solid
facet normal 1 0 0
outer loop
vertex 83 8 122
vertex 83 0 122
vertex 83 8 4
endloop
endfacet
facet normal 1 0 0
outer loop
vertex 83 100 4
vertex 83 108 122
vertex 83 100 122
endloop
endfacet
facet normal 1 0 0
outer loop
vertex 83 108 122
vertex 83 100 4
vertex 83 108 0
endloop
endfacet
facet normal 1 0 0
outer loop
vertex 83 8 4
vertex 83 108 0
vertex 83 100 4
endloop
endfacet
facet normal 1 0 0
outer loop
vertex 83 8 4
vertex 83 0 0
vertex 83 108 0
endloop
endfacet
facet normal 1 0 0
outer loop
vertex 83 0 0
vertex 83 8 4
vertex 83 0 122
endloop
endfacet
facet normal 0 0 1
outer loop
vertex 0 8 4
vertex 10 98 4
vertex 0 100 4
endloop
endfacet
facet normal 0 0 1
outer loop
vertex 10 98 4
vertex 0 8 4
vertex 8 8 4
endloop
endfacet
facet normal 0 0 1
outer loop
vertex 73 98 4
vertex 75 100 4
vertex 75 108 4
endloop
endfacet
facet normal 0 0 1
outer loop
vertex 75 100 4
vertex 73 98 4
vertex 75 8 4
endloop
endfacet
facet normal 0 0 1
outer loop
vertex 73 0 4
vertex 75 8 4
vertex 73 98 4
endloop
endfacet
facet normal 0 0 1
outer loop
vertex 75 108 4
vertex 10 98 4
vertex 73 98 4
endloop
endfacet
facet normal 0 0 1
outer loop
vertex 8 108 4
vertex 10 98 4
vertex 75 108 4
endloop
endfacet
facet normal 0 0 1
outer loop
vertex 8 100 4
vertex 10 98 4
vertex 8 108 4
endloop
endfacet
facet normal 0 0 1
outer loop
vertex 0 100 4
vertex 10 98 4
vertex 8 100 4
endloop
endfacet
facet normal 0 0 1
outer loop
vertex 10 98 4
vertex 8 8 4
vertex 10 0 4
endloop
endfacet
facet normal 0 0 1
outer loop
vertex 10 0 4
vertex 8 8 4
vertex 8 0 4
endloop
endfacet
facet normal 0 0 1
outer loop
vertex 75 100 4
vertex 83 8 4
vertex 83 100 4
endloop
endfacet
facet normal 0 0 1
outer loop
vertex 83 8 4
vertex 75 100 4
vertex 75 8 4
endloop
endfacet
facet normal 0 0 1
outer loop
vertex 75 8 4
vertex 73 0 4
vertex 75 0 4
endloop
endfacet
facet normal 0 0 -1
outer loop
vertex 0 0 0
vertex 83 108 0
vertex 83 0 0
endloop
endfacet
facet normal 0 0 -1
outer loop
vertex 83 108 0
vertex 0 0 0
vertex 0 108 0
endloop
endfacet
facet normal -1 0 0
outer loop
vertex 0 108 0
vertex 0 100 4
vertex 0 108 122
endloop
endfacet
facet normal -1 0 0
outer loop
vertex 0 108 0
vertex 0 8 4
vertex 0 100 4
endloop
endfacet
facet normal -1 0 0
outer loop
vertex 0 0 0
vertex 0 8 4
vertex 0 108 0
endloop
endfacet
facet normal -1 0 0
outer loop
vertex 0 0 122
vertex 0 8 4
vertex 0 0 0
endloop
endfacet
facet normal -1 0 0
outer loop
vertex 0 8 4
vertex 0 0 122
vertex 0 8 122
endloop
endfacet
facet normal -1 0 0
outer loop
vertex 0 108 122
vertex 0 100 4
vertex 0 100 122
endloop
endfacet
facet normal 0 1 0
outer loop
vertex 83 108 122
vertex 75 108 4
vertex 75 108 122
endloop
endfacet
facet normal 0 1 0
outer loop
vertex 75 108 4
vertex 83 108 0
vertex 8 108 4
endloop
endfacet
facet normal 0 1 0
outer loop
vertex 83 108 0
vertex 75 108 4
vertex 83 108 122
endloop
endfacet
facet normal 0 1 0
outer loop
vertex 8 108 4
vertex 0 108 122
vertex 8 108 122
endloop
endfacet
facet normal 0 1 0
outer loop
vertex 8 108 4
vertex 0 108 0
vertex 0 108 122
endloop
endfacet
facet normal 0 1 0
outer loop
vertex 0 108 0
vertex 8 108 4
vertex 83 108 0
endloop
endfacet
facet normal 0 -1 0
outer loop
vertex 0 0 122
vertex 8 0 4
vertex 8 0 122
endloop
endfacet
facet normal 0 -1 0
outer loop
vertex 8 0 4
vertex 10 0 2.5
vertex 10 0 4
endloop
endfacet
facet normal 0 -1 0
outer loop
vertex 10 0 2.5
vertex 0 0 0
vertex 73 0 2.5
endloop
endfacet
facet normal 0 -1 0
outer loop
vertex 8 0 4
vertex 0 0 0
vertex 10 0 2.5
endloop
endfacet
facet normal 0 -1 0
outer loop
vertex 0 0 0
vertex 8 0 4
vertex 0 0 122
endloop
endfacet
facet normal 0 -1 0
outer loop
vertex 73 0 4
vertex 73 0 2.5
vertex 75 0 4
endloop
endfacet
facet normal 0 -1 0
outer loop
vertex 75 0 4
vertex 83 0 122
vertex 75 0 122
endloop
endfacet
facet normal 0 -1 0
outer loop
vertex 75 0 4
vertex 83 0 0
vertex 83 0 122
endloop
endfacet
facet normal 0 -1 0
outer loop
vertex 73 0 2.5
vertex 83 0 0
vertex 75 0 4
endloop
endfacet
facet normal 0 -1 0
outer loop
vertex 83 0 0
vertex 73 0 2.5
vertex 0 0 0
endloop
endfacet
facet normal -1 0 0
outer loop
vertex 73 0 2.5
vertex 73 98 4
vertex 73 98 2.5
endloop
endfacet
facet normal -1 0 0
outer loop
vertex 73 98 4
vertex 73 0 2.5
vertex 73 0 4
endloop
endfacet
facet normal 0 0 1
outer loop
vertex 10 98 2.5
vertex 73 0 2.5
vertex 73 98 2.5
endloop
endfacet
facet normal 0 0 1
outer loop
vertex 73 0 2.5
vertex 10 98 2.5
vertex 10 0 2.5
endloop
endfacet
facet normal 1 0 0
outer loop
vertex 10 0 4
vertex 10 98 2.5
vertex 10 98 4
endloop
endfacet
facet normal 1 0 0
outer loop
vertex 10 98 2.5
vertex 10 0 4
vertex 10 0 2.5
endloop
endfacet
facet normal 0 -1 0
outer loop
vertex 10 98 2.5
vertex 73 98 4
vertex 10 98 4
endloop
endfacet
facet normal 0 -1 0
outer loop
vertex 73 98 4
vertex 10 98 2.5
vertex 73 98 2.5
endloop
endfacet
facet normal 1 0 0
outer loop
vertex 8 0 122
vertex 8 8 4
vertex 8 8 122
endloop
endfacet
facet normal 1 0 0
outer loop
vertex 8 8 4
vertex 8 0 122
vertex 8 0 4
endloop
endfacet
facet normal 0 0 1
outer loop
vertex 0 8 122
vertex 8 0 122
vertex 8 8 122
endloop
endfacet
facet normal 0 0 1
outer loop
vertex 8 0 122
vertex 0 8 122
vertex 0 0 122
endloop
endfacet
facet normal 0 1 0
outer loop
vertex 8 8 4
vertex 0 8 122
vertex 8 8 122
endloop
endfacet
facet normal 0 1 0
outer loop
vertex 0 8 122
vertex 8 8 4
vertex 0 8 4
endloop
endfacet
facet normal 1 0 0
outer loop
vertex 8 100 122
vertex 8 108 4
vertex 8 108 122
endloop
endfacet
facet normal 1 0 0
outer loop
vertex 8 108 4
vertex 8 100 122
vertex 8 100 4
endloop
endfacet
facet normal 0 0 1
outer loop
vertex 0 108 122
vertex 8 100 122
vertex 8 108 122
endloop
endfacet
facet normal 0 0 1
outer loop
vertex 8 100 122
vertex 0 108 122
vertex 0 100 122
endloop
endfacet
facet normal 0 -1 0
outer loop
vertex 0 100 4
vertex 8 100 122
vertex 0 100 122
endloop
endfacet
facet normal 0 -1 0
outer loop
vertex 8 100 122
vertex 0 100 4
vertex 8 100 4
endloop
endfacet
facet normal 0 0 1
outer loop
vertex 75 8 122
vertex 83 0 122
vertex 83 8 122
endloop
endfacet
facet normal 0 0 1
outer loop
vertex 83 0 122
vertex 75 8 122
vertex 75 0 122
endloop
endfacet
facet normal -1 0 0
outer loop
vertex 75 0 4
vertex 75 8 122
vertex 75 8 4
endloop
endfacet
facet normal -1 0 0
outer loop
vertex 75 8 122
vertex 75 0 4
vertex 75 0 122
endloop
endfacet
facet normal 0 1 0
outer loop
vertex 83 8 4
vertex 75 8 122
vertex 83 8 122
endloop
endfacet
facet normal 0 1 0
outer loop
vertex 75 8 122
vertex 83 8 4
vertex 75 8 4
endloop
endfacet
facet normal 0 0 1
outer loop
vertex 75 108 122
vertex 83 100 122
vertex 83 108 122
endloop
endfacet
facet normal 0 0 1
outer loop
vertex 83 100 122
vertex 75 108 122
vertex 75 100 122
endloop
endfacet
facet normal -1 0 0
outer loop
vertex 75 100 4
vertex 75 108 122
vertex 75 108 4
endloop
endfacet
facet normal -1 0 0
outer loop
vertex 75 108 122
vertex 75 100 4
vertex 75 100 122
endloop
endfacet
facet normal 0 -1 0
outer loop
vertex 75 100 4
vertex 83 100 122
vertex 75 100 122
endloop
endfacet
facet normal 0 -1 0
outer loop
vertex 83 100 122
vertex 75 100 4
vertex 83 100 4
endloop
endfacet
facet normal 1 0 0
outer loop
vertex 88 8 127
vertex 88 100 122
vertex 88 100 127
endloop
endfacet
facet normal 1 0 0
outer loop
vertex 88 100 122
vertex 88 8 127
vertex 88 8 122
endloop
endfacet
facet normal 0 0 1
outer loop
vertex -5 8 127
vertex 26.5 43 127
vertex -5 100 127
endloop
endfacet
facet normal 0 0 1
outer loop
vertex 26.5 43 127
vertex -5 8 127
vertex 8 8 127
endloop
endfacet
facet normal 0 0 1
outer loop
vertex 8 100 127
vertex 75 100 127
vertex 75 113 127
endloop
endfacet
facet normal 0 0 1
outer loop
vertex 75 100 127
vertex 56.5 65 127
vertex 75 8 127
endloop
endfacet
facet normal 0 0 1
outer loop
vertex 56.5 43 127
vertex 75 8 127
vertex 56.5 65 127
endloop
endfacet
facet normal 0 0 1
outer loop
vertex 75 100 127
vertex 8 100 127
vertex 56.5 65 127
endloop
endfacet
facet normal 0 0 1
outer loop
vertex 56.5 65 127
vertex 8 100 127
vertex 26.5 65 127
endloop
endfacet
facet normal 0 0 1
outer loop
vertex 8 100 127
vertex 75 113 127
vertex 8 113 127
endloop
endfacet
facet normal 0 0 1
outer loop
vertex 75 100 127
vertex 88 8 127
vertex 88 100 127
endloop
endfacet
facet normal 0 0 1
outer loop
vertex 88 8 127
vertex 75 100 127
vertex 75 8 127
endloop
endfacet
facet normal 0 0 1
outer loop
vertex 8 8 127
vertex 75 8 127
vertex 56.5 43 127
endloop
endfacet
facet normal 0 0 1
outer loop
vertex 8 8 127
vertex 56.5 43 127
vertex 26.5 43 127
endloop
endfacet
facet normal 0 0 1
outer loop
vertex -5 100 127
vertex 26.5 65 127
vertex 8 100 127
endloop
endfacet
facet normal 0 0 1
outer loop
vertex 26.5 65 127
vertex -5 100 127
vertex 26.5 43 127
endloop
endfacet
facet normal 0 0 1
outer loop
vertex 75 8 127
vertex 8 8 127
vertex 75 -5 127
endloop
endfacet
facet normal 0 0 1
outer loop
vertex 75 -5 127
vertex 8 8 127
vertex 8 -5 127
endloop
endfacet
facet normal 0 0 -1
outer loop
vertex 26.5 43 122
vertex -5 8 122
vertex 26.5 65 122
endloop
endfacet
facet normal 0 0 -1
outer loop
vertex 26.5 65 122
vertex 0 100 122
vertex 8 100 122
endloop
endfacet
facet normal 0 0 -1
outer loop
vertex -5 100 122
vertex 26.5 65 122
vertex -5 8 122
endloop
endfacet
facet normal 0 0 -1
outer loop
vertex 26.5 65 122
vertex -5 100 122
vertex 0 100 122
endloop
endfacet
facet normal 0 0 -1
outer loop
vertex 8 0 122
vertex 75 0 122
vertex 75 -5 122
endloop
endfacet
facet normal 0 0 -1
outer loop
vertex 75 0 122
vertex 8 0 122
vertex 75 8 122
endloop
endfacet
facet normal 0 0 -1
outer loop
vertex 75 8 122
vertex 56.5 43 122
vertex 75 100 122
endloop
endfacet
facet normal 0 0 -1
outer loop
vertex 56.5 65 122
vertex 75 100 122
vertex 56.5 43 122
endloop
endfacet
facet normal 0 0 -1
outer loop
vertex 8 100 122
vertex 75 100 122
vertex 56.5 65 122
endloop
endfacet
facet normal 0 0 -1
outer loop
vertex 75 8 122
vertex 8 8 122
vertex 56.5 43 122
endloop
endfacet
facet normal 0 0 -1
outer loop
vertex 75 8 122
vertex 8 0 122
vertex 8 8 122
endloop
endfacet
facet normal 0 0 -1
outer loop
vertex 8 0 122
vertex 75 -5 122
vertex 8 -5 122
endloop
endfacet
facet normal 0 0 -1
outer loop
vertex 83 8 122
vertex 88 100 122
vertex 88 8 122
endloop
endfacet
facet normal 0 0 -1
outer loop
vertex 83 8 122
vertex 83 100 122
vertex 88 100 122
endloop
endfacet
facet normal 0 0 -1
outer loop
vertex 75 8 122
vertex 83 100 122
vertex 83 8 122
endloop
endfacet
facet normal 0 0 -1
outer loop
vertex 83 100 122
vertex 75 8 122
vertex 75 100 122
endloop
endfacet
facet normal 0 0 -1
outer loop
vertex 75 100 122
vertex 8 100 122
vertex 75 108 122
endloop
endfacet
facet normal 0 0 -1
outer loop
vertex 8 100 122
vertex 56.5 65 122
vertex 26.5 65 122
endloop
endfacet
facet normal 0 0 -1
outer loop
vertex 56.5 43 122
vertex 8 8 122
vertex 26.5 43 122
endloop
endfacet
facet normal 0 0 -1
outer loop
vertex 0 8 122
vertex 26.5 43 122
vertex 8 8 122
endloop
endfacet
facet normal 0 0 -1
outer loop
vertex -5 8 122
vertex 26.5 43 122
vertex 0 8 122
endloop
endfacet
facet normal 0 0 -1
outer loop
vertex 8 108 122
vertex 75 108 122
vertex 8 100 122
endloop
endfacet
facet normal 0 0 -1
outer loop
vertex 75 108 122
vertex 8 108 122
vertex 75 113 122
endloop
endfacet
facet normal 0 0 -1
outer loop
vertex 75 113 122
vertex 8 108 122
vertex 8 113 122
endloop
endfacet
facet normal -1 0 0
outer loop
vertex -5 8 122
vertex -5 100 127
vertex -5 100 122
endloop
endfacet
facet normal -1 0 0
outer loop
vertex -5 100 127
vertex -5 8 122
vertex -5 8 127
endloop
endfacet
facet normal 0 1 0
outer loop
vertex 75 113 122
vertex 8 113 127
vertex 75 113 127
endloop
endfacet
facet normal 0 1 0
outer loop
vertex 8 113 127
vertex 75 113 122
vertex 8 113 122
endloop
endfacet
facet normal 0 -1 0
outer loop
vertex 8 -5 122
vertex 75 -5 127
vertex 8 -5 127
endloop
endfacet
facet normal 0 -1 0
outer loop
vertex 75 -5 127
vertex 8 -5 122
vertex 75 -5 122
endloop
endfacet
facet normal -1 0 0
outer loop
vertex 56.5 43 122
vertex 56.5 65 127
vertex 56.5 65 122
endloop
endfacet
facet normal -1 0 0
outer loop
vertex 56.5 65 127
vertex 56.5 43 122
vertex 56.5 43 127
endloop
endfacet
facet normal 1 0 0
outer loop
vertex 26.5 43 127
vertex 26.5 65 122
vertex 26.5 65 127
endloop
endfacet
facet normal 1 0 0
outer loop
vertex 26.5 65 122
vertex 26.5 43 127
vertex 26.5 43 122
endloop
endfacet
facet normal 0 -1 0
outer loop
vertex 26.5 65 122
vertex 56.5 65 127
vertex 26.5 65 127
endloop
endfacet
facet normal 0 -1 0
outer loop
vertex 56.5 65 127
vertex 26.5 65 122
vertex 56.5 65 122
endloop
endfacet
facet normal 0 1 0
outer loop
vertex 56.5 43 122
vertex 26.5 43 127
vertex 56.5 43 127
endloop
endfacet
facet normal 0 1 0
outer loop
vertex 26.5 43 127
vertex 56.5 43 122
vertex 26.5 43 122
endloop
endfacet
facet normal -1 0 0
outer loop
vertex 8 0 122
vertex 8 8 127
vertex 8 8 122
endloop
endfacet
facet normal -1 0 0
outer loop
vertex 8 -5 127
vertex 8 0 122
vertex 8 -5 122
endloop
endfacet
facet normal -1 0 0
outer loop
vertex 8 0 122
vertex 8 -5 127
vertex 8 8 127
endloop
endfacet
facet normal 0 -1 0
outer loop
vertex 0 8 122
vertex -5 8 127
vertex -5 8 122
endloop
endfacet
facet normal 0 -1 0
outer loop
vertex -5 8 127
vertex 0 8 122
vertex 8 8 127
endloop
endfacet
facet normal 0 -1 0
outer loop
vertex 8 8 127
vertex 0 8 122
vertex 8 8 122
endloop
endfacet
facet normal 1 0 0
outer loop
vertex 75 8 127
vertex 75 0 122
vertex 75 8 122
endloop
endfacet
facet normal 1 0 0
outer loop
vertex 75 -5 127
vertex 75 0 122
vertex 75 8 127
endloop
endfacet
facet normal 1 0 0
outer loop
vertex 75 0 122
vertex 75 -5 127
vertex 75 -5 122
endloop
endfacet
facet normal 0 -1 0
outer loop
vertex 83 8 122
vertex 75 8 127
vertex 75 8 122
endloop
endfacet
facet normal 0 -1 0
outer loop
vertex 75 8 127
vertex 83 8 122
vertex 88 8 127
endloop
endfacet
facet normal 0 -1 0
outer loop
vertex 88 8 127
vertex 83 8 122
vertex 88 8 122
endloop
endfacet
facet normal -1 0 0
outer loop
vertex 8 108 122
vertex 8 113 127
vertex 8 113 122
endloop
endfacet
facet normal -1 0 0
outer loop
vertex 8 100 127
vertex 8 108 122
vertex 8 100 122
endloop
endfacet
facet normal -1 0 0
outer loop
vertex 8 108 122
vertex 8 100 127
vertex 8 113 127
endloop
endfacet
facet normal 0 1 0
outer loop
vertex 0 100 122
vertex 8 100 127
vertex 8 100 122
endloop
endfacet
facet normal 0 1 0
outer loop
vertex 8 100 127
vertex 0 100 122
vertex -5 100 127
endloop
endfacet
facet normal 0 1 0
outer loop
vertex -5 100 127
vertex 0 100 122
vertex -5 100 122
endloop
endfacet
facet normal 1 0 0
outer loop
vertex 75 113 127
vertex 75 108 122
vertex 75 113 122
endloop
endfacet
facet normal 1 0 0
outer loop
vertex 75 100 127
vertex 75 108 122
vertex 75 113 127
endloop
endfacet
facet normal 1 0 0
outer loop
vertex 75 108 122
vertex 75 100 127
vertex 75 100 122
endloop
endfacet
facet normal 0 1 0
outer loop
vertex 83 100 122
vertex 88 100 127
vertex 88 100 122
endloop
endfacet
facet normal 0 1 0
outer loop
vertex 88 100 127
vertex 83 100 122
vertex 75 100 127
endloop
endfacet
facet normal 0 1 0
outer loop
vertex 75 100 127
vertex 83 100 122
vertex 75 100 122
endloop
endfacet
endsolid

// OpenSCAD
// BinderBot Scanner Mount
// Camera: NexiGo N930AF
// Target height: 5" (127mm) camera lens to card surface
// Card: standard Pokemon (63mm x 88mm)

// ── Tunables ──────────────────────────────────────────────────────────────────
card_w        = 63;    // Pokemon card width (mm)
card_h        = 88;    // Pokemon card height (mm)
card_recess   = 1.5;   // depth of card guide channel in base

base_margin   = 10;    // extra base around card on each side
base_thick    = 4;     // base plate thickness

post_w        = 8;     // square post width
post_height   = 118;   // post height — lens ends up ~127mm above card surface
                       // (base_thick + post_height + shelf_thick ≈ 127mm)

shelf_thick   = 5;     // top shelf thickness
shelf_margin  = 5;     // shelf overhang past posts

// Camera clip slot (fits N930AF monitor-clip foot)
clip_slot_w   = 30;
clip_slot_d   = 22;
clip_slot_h   = shelf_thick + 2; // through the shelf

// ── Computed ──────────────────────────────────────────────────────────────────
base_w = card_w + base_margin * 2;
base_d = card_h + base_margin * 2;

shelf_w = base_w + shelf_margin * 2;
shelf_d = base_d + shelf_margin * 2;

module base_plate() {
    difference() {
        cube([base_w, base_d, base_thick]);
        // Card guide channel — open on front (Y=0) so cards slide in/out easily.
        // Left + right walls and back wall remain as guides; front is open.
        // Channel runs from Y=0 to the back of the card position (back wall = card stop).
        translate([(base_w - card_w) / 2, -0.1, base_thick - card_recess])
            cube([card_w, (base_d - card_h) / 2 + card_h + 0.1, card_recess + 0.1]);
    }
}

module posts() {
    // Four corner posts
    for (x = [0, base_w - post_w])
        for (y = [0, base_d - post_w])
            translate([x, y, base_thick])
                cube([post_w, post_w, post_height]);
}

module top_shelf() {
    translate([-(shelf_margin), -(shelf_margin), base_thick + post_height])
    difference() {
        cube([shelf_w, shelf_d, shelf_thick]);
        // Camera clip slot (centered)
        translate([(shelf_w - clip_slot_w) / 2, (shelf_d - clip_slot_d) / 2, -0.1])
            cube([clip_slot_w, clip_slot_d, clip_slot_h]);
        // Corner notches so shelf clears posts cleanly
        translate([0, 0, -0.1])                          cube([shelf_margin + post_w, shelf_margin + post_w, shelf_thick + 0.2]);
        translate([shelf_w - shelf_margin - post_w, 0, -0.1])  cube([shelf_margin + post_w, shelf_margin + post_w, shelf_thick + 0.2]);
        translate([0, shelf_d - shelf_margin - post_w, -0.1])  cube([shelf_margin + post_w, shelf_margin + post_w, shelf_thick + 0.2]);
        translate([shelf_w - shelf_margin - post_w, shelf_d - shelf_margin - post_w, -0.1]) cube([shelf_margin + post_w, shelf_margin + post_w, shelf_thick + 0.2]);
    }
}

// ── Assembly ──────────────────────────────────────────────────────────────────
base_plate();
posts();
top_shelf();
